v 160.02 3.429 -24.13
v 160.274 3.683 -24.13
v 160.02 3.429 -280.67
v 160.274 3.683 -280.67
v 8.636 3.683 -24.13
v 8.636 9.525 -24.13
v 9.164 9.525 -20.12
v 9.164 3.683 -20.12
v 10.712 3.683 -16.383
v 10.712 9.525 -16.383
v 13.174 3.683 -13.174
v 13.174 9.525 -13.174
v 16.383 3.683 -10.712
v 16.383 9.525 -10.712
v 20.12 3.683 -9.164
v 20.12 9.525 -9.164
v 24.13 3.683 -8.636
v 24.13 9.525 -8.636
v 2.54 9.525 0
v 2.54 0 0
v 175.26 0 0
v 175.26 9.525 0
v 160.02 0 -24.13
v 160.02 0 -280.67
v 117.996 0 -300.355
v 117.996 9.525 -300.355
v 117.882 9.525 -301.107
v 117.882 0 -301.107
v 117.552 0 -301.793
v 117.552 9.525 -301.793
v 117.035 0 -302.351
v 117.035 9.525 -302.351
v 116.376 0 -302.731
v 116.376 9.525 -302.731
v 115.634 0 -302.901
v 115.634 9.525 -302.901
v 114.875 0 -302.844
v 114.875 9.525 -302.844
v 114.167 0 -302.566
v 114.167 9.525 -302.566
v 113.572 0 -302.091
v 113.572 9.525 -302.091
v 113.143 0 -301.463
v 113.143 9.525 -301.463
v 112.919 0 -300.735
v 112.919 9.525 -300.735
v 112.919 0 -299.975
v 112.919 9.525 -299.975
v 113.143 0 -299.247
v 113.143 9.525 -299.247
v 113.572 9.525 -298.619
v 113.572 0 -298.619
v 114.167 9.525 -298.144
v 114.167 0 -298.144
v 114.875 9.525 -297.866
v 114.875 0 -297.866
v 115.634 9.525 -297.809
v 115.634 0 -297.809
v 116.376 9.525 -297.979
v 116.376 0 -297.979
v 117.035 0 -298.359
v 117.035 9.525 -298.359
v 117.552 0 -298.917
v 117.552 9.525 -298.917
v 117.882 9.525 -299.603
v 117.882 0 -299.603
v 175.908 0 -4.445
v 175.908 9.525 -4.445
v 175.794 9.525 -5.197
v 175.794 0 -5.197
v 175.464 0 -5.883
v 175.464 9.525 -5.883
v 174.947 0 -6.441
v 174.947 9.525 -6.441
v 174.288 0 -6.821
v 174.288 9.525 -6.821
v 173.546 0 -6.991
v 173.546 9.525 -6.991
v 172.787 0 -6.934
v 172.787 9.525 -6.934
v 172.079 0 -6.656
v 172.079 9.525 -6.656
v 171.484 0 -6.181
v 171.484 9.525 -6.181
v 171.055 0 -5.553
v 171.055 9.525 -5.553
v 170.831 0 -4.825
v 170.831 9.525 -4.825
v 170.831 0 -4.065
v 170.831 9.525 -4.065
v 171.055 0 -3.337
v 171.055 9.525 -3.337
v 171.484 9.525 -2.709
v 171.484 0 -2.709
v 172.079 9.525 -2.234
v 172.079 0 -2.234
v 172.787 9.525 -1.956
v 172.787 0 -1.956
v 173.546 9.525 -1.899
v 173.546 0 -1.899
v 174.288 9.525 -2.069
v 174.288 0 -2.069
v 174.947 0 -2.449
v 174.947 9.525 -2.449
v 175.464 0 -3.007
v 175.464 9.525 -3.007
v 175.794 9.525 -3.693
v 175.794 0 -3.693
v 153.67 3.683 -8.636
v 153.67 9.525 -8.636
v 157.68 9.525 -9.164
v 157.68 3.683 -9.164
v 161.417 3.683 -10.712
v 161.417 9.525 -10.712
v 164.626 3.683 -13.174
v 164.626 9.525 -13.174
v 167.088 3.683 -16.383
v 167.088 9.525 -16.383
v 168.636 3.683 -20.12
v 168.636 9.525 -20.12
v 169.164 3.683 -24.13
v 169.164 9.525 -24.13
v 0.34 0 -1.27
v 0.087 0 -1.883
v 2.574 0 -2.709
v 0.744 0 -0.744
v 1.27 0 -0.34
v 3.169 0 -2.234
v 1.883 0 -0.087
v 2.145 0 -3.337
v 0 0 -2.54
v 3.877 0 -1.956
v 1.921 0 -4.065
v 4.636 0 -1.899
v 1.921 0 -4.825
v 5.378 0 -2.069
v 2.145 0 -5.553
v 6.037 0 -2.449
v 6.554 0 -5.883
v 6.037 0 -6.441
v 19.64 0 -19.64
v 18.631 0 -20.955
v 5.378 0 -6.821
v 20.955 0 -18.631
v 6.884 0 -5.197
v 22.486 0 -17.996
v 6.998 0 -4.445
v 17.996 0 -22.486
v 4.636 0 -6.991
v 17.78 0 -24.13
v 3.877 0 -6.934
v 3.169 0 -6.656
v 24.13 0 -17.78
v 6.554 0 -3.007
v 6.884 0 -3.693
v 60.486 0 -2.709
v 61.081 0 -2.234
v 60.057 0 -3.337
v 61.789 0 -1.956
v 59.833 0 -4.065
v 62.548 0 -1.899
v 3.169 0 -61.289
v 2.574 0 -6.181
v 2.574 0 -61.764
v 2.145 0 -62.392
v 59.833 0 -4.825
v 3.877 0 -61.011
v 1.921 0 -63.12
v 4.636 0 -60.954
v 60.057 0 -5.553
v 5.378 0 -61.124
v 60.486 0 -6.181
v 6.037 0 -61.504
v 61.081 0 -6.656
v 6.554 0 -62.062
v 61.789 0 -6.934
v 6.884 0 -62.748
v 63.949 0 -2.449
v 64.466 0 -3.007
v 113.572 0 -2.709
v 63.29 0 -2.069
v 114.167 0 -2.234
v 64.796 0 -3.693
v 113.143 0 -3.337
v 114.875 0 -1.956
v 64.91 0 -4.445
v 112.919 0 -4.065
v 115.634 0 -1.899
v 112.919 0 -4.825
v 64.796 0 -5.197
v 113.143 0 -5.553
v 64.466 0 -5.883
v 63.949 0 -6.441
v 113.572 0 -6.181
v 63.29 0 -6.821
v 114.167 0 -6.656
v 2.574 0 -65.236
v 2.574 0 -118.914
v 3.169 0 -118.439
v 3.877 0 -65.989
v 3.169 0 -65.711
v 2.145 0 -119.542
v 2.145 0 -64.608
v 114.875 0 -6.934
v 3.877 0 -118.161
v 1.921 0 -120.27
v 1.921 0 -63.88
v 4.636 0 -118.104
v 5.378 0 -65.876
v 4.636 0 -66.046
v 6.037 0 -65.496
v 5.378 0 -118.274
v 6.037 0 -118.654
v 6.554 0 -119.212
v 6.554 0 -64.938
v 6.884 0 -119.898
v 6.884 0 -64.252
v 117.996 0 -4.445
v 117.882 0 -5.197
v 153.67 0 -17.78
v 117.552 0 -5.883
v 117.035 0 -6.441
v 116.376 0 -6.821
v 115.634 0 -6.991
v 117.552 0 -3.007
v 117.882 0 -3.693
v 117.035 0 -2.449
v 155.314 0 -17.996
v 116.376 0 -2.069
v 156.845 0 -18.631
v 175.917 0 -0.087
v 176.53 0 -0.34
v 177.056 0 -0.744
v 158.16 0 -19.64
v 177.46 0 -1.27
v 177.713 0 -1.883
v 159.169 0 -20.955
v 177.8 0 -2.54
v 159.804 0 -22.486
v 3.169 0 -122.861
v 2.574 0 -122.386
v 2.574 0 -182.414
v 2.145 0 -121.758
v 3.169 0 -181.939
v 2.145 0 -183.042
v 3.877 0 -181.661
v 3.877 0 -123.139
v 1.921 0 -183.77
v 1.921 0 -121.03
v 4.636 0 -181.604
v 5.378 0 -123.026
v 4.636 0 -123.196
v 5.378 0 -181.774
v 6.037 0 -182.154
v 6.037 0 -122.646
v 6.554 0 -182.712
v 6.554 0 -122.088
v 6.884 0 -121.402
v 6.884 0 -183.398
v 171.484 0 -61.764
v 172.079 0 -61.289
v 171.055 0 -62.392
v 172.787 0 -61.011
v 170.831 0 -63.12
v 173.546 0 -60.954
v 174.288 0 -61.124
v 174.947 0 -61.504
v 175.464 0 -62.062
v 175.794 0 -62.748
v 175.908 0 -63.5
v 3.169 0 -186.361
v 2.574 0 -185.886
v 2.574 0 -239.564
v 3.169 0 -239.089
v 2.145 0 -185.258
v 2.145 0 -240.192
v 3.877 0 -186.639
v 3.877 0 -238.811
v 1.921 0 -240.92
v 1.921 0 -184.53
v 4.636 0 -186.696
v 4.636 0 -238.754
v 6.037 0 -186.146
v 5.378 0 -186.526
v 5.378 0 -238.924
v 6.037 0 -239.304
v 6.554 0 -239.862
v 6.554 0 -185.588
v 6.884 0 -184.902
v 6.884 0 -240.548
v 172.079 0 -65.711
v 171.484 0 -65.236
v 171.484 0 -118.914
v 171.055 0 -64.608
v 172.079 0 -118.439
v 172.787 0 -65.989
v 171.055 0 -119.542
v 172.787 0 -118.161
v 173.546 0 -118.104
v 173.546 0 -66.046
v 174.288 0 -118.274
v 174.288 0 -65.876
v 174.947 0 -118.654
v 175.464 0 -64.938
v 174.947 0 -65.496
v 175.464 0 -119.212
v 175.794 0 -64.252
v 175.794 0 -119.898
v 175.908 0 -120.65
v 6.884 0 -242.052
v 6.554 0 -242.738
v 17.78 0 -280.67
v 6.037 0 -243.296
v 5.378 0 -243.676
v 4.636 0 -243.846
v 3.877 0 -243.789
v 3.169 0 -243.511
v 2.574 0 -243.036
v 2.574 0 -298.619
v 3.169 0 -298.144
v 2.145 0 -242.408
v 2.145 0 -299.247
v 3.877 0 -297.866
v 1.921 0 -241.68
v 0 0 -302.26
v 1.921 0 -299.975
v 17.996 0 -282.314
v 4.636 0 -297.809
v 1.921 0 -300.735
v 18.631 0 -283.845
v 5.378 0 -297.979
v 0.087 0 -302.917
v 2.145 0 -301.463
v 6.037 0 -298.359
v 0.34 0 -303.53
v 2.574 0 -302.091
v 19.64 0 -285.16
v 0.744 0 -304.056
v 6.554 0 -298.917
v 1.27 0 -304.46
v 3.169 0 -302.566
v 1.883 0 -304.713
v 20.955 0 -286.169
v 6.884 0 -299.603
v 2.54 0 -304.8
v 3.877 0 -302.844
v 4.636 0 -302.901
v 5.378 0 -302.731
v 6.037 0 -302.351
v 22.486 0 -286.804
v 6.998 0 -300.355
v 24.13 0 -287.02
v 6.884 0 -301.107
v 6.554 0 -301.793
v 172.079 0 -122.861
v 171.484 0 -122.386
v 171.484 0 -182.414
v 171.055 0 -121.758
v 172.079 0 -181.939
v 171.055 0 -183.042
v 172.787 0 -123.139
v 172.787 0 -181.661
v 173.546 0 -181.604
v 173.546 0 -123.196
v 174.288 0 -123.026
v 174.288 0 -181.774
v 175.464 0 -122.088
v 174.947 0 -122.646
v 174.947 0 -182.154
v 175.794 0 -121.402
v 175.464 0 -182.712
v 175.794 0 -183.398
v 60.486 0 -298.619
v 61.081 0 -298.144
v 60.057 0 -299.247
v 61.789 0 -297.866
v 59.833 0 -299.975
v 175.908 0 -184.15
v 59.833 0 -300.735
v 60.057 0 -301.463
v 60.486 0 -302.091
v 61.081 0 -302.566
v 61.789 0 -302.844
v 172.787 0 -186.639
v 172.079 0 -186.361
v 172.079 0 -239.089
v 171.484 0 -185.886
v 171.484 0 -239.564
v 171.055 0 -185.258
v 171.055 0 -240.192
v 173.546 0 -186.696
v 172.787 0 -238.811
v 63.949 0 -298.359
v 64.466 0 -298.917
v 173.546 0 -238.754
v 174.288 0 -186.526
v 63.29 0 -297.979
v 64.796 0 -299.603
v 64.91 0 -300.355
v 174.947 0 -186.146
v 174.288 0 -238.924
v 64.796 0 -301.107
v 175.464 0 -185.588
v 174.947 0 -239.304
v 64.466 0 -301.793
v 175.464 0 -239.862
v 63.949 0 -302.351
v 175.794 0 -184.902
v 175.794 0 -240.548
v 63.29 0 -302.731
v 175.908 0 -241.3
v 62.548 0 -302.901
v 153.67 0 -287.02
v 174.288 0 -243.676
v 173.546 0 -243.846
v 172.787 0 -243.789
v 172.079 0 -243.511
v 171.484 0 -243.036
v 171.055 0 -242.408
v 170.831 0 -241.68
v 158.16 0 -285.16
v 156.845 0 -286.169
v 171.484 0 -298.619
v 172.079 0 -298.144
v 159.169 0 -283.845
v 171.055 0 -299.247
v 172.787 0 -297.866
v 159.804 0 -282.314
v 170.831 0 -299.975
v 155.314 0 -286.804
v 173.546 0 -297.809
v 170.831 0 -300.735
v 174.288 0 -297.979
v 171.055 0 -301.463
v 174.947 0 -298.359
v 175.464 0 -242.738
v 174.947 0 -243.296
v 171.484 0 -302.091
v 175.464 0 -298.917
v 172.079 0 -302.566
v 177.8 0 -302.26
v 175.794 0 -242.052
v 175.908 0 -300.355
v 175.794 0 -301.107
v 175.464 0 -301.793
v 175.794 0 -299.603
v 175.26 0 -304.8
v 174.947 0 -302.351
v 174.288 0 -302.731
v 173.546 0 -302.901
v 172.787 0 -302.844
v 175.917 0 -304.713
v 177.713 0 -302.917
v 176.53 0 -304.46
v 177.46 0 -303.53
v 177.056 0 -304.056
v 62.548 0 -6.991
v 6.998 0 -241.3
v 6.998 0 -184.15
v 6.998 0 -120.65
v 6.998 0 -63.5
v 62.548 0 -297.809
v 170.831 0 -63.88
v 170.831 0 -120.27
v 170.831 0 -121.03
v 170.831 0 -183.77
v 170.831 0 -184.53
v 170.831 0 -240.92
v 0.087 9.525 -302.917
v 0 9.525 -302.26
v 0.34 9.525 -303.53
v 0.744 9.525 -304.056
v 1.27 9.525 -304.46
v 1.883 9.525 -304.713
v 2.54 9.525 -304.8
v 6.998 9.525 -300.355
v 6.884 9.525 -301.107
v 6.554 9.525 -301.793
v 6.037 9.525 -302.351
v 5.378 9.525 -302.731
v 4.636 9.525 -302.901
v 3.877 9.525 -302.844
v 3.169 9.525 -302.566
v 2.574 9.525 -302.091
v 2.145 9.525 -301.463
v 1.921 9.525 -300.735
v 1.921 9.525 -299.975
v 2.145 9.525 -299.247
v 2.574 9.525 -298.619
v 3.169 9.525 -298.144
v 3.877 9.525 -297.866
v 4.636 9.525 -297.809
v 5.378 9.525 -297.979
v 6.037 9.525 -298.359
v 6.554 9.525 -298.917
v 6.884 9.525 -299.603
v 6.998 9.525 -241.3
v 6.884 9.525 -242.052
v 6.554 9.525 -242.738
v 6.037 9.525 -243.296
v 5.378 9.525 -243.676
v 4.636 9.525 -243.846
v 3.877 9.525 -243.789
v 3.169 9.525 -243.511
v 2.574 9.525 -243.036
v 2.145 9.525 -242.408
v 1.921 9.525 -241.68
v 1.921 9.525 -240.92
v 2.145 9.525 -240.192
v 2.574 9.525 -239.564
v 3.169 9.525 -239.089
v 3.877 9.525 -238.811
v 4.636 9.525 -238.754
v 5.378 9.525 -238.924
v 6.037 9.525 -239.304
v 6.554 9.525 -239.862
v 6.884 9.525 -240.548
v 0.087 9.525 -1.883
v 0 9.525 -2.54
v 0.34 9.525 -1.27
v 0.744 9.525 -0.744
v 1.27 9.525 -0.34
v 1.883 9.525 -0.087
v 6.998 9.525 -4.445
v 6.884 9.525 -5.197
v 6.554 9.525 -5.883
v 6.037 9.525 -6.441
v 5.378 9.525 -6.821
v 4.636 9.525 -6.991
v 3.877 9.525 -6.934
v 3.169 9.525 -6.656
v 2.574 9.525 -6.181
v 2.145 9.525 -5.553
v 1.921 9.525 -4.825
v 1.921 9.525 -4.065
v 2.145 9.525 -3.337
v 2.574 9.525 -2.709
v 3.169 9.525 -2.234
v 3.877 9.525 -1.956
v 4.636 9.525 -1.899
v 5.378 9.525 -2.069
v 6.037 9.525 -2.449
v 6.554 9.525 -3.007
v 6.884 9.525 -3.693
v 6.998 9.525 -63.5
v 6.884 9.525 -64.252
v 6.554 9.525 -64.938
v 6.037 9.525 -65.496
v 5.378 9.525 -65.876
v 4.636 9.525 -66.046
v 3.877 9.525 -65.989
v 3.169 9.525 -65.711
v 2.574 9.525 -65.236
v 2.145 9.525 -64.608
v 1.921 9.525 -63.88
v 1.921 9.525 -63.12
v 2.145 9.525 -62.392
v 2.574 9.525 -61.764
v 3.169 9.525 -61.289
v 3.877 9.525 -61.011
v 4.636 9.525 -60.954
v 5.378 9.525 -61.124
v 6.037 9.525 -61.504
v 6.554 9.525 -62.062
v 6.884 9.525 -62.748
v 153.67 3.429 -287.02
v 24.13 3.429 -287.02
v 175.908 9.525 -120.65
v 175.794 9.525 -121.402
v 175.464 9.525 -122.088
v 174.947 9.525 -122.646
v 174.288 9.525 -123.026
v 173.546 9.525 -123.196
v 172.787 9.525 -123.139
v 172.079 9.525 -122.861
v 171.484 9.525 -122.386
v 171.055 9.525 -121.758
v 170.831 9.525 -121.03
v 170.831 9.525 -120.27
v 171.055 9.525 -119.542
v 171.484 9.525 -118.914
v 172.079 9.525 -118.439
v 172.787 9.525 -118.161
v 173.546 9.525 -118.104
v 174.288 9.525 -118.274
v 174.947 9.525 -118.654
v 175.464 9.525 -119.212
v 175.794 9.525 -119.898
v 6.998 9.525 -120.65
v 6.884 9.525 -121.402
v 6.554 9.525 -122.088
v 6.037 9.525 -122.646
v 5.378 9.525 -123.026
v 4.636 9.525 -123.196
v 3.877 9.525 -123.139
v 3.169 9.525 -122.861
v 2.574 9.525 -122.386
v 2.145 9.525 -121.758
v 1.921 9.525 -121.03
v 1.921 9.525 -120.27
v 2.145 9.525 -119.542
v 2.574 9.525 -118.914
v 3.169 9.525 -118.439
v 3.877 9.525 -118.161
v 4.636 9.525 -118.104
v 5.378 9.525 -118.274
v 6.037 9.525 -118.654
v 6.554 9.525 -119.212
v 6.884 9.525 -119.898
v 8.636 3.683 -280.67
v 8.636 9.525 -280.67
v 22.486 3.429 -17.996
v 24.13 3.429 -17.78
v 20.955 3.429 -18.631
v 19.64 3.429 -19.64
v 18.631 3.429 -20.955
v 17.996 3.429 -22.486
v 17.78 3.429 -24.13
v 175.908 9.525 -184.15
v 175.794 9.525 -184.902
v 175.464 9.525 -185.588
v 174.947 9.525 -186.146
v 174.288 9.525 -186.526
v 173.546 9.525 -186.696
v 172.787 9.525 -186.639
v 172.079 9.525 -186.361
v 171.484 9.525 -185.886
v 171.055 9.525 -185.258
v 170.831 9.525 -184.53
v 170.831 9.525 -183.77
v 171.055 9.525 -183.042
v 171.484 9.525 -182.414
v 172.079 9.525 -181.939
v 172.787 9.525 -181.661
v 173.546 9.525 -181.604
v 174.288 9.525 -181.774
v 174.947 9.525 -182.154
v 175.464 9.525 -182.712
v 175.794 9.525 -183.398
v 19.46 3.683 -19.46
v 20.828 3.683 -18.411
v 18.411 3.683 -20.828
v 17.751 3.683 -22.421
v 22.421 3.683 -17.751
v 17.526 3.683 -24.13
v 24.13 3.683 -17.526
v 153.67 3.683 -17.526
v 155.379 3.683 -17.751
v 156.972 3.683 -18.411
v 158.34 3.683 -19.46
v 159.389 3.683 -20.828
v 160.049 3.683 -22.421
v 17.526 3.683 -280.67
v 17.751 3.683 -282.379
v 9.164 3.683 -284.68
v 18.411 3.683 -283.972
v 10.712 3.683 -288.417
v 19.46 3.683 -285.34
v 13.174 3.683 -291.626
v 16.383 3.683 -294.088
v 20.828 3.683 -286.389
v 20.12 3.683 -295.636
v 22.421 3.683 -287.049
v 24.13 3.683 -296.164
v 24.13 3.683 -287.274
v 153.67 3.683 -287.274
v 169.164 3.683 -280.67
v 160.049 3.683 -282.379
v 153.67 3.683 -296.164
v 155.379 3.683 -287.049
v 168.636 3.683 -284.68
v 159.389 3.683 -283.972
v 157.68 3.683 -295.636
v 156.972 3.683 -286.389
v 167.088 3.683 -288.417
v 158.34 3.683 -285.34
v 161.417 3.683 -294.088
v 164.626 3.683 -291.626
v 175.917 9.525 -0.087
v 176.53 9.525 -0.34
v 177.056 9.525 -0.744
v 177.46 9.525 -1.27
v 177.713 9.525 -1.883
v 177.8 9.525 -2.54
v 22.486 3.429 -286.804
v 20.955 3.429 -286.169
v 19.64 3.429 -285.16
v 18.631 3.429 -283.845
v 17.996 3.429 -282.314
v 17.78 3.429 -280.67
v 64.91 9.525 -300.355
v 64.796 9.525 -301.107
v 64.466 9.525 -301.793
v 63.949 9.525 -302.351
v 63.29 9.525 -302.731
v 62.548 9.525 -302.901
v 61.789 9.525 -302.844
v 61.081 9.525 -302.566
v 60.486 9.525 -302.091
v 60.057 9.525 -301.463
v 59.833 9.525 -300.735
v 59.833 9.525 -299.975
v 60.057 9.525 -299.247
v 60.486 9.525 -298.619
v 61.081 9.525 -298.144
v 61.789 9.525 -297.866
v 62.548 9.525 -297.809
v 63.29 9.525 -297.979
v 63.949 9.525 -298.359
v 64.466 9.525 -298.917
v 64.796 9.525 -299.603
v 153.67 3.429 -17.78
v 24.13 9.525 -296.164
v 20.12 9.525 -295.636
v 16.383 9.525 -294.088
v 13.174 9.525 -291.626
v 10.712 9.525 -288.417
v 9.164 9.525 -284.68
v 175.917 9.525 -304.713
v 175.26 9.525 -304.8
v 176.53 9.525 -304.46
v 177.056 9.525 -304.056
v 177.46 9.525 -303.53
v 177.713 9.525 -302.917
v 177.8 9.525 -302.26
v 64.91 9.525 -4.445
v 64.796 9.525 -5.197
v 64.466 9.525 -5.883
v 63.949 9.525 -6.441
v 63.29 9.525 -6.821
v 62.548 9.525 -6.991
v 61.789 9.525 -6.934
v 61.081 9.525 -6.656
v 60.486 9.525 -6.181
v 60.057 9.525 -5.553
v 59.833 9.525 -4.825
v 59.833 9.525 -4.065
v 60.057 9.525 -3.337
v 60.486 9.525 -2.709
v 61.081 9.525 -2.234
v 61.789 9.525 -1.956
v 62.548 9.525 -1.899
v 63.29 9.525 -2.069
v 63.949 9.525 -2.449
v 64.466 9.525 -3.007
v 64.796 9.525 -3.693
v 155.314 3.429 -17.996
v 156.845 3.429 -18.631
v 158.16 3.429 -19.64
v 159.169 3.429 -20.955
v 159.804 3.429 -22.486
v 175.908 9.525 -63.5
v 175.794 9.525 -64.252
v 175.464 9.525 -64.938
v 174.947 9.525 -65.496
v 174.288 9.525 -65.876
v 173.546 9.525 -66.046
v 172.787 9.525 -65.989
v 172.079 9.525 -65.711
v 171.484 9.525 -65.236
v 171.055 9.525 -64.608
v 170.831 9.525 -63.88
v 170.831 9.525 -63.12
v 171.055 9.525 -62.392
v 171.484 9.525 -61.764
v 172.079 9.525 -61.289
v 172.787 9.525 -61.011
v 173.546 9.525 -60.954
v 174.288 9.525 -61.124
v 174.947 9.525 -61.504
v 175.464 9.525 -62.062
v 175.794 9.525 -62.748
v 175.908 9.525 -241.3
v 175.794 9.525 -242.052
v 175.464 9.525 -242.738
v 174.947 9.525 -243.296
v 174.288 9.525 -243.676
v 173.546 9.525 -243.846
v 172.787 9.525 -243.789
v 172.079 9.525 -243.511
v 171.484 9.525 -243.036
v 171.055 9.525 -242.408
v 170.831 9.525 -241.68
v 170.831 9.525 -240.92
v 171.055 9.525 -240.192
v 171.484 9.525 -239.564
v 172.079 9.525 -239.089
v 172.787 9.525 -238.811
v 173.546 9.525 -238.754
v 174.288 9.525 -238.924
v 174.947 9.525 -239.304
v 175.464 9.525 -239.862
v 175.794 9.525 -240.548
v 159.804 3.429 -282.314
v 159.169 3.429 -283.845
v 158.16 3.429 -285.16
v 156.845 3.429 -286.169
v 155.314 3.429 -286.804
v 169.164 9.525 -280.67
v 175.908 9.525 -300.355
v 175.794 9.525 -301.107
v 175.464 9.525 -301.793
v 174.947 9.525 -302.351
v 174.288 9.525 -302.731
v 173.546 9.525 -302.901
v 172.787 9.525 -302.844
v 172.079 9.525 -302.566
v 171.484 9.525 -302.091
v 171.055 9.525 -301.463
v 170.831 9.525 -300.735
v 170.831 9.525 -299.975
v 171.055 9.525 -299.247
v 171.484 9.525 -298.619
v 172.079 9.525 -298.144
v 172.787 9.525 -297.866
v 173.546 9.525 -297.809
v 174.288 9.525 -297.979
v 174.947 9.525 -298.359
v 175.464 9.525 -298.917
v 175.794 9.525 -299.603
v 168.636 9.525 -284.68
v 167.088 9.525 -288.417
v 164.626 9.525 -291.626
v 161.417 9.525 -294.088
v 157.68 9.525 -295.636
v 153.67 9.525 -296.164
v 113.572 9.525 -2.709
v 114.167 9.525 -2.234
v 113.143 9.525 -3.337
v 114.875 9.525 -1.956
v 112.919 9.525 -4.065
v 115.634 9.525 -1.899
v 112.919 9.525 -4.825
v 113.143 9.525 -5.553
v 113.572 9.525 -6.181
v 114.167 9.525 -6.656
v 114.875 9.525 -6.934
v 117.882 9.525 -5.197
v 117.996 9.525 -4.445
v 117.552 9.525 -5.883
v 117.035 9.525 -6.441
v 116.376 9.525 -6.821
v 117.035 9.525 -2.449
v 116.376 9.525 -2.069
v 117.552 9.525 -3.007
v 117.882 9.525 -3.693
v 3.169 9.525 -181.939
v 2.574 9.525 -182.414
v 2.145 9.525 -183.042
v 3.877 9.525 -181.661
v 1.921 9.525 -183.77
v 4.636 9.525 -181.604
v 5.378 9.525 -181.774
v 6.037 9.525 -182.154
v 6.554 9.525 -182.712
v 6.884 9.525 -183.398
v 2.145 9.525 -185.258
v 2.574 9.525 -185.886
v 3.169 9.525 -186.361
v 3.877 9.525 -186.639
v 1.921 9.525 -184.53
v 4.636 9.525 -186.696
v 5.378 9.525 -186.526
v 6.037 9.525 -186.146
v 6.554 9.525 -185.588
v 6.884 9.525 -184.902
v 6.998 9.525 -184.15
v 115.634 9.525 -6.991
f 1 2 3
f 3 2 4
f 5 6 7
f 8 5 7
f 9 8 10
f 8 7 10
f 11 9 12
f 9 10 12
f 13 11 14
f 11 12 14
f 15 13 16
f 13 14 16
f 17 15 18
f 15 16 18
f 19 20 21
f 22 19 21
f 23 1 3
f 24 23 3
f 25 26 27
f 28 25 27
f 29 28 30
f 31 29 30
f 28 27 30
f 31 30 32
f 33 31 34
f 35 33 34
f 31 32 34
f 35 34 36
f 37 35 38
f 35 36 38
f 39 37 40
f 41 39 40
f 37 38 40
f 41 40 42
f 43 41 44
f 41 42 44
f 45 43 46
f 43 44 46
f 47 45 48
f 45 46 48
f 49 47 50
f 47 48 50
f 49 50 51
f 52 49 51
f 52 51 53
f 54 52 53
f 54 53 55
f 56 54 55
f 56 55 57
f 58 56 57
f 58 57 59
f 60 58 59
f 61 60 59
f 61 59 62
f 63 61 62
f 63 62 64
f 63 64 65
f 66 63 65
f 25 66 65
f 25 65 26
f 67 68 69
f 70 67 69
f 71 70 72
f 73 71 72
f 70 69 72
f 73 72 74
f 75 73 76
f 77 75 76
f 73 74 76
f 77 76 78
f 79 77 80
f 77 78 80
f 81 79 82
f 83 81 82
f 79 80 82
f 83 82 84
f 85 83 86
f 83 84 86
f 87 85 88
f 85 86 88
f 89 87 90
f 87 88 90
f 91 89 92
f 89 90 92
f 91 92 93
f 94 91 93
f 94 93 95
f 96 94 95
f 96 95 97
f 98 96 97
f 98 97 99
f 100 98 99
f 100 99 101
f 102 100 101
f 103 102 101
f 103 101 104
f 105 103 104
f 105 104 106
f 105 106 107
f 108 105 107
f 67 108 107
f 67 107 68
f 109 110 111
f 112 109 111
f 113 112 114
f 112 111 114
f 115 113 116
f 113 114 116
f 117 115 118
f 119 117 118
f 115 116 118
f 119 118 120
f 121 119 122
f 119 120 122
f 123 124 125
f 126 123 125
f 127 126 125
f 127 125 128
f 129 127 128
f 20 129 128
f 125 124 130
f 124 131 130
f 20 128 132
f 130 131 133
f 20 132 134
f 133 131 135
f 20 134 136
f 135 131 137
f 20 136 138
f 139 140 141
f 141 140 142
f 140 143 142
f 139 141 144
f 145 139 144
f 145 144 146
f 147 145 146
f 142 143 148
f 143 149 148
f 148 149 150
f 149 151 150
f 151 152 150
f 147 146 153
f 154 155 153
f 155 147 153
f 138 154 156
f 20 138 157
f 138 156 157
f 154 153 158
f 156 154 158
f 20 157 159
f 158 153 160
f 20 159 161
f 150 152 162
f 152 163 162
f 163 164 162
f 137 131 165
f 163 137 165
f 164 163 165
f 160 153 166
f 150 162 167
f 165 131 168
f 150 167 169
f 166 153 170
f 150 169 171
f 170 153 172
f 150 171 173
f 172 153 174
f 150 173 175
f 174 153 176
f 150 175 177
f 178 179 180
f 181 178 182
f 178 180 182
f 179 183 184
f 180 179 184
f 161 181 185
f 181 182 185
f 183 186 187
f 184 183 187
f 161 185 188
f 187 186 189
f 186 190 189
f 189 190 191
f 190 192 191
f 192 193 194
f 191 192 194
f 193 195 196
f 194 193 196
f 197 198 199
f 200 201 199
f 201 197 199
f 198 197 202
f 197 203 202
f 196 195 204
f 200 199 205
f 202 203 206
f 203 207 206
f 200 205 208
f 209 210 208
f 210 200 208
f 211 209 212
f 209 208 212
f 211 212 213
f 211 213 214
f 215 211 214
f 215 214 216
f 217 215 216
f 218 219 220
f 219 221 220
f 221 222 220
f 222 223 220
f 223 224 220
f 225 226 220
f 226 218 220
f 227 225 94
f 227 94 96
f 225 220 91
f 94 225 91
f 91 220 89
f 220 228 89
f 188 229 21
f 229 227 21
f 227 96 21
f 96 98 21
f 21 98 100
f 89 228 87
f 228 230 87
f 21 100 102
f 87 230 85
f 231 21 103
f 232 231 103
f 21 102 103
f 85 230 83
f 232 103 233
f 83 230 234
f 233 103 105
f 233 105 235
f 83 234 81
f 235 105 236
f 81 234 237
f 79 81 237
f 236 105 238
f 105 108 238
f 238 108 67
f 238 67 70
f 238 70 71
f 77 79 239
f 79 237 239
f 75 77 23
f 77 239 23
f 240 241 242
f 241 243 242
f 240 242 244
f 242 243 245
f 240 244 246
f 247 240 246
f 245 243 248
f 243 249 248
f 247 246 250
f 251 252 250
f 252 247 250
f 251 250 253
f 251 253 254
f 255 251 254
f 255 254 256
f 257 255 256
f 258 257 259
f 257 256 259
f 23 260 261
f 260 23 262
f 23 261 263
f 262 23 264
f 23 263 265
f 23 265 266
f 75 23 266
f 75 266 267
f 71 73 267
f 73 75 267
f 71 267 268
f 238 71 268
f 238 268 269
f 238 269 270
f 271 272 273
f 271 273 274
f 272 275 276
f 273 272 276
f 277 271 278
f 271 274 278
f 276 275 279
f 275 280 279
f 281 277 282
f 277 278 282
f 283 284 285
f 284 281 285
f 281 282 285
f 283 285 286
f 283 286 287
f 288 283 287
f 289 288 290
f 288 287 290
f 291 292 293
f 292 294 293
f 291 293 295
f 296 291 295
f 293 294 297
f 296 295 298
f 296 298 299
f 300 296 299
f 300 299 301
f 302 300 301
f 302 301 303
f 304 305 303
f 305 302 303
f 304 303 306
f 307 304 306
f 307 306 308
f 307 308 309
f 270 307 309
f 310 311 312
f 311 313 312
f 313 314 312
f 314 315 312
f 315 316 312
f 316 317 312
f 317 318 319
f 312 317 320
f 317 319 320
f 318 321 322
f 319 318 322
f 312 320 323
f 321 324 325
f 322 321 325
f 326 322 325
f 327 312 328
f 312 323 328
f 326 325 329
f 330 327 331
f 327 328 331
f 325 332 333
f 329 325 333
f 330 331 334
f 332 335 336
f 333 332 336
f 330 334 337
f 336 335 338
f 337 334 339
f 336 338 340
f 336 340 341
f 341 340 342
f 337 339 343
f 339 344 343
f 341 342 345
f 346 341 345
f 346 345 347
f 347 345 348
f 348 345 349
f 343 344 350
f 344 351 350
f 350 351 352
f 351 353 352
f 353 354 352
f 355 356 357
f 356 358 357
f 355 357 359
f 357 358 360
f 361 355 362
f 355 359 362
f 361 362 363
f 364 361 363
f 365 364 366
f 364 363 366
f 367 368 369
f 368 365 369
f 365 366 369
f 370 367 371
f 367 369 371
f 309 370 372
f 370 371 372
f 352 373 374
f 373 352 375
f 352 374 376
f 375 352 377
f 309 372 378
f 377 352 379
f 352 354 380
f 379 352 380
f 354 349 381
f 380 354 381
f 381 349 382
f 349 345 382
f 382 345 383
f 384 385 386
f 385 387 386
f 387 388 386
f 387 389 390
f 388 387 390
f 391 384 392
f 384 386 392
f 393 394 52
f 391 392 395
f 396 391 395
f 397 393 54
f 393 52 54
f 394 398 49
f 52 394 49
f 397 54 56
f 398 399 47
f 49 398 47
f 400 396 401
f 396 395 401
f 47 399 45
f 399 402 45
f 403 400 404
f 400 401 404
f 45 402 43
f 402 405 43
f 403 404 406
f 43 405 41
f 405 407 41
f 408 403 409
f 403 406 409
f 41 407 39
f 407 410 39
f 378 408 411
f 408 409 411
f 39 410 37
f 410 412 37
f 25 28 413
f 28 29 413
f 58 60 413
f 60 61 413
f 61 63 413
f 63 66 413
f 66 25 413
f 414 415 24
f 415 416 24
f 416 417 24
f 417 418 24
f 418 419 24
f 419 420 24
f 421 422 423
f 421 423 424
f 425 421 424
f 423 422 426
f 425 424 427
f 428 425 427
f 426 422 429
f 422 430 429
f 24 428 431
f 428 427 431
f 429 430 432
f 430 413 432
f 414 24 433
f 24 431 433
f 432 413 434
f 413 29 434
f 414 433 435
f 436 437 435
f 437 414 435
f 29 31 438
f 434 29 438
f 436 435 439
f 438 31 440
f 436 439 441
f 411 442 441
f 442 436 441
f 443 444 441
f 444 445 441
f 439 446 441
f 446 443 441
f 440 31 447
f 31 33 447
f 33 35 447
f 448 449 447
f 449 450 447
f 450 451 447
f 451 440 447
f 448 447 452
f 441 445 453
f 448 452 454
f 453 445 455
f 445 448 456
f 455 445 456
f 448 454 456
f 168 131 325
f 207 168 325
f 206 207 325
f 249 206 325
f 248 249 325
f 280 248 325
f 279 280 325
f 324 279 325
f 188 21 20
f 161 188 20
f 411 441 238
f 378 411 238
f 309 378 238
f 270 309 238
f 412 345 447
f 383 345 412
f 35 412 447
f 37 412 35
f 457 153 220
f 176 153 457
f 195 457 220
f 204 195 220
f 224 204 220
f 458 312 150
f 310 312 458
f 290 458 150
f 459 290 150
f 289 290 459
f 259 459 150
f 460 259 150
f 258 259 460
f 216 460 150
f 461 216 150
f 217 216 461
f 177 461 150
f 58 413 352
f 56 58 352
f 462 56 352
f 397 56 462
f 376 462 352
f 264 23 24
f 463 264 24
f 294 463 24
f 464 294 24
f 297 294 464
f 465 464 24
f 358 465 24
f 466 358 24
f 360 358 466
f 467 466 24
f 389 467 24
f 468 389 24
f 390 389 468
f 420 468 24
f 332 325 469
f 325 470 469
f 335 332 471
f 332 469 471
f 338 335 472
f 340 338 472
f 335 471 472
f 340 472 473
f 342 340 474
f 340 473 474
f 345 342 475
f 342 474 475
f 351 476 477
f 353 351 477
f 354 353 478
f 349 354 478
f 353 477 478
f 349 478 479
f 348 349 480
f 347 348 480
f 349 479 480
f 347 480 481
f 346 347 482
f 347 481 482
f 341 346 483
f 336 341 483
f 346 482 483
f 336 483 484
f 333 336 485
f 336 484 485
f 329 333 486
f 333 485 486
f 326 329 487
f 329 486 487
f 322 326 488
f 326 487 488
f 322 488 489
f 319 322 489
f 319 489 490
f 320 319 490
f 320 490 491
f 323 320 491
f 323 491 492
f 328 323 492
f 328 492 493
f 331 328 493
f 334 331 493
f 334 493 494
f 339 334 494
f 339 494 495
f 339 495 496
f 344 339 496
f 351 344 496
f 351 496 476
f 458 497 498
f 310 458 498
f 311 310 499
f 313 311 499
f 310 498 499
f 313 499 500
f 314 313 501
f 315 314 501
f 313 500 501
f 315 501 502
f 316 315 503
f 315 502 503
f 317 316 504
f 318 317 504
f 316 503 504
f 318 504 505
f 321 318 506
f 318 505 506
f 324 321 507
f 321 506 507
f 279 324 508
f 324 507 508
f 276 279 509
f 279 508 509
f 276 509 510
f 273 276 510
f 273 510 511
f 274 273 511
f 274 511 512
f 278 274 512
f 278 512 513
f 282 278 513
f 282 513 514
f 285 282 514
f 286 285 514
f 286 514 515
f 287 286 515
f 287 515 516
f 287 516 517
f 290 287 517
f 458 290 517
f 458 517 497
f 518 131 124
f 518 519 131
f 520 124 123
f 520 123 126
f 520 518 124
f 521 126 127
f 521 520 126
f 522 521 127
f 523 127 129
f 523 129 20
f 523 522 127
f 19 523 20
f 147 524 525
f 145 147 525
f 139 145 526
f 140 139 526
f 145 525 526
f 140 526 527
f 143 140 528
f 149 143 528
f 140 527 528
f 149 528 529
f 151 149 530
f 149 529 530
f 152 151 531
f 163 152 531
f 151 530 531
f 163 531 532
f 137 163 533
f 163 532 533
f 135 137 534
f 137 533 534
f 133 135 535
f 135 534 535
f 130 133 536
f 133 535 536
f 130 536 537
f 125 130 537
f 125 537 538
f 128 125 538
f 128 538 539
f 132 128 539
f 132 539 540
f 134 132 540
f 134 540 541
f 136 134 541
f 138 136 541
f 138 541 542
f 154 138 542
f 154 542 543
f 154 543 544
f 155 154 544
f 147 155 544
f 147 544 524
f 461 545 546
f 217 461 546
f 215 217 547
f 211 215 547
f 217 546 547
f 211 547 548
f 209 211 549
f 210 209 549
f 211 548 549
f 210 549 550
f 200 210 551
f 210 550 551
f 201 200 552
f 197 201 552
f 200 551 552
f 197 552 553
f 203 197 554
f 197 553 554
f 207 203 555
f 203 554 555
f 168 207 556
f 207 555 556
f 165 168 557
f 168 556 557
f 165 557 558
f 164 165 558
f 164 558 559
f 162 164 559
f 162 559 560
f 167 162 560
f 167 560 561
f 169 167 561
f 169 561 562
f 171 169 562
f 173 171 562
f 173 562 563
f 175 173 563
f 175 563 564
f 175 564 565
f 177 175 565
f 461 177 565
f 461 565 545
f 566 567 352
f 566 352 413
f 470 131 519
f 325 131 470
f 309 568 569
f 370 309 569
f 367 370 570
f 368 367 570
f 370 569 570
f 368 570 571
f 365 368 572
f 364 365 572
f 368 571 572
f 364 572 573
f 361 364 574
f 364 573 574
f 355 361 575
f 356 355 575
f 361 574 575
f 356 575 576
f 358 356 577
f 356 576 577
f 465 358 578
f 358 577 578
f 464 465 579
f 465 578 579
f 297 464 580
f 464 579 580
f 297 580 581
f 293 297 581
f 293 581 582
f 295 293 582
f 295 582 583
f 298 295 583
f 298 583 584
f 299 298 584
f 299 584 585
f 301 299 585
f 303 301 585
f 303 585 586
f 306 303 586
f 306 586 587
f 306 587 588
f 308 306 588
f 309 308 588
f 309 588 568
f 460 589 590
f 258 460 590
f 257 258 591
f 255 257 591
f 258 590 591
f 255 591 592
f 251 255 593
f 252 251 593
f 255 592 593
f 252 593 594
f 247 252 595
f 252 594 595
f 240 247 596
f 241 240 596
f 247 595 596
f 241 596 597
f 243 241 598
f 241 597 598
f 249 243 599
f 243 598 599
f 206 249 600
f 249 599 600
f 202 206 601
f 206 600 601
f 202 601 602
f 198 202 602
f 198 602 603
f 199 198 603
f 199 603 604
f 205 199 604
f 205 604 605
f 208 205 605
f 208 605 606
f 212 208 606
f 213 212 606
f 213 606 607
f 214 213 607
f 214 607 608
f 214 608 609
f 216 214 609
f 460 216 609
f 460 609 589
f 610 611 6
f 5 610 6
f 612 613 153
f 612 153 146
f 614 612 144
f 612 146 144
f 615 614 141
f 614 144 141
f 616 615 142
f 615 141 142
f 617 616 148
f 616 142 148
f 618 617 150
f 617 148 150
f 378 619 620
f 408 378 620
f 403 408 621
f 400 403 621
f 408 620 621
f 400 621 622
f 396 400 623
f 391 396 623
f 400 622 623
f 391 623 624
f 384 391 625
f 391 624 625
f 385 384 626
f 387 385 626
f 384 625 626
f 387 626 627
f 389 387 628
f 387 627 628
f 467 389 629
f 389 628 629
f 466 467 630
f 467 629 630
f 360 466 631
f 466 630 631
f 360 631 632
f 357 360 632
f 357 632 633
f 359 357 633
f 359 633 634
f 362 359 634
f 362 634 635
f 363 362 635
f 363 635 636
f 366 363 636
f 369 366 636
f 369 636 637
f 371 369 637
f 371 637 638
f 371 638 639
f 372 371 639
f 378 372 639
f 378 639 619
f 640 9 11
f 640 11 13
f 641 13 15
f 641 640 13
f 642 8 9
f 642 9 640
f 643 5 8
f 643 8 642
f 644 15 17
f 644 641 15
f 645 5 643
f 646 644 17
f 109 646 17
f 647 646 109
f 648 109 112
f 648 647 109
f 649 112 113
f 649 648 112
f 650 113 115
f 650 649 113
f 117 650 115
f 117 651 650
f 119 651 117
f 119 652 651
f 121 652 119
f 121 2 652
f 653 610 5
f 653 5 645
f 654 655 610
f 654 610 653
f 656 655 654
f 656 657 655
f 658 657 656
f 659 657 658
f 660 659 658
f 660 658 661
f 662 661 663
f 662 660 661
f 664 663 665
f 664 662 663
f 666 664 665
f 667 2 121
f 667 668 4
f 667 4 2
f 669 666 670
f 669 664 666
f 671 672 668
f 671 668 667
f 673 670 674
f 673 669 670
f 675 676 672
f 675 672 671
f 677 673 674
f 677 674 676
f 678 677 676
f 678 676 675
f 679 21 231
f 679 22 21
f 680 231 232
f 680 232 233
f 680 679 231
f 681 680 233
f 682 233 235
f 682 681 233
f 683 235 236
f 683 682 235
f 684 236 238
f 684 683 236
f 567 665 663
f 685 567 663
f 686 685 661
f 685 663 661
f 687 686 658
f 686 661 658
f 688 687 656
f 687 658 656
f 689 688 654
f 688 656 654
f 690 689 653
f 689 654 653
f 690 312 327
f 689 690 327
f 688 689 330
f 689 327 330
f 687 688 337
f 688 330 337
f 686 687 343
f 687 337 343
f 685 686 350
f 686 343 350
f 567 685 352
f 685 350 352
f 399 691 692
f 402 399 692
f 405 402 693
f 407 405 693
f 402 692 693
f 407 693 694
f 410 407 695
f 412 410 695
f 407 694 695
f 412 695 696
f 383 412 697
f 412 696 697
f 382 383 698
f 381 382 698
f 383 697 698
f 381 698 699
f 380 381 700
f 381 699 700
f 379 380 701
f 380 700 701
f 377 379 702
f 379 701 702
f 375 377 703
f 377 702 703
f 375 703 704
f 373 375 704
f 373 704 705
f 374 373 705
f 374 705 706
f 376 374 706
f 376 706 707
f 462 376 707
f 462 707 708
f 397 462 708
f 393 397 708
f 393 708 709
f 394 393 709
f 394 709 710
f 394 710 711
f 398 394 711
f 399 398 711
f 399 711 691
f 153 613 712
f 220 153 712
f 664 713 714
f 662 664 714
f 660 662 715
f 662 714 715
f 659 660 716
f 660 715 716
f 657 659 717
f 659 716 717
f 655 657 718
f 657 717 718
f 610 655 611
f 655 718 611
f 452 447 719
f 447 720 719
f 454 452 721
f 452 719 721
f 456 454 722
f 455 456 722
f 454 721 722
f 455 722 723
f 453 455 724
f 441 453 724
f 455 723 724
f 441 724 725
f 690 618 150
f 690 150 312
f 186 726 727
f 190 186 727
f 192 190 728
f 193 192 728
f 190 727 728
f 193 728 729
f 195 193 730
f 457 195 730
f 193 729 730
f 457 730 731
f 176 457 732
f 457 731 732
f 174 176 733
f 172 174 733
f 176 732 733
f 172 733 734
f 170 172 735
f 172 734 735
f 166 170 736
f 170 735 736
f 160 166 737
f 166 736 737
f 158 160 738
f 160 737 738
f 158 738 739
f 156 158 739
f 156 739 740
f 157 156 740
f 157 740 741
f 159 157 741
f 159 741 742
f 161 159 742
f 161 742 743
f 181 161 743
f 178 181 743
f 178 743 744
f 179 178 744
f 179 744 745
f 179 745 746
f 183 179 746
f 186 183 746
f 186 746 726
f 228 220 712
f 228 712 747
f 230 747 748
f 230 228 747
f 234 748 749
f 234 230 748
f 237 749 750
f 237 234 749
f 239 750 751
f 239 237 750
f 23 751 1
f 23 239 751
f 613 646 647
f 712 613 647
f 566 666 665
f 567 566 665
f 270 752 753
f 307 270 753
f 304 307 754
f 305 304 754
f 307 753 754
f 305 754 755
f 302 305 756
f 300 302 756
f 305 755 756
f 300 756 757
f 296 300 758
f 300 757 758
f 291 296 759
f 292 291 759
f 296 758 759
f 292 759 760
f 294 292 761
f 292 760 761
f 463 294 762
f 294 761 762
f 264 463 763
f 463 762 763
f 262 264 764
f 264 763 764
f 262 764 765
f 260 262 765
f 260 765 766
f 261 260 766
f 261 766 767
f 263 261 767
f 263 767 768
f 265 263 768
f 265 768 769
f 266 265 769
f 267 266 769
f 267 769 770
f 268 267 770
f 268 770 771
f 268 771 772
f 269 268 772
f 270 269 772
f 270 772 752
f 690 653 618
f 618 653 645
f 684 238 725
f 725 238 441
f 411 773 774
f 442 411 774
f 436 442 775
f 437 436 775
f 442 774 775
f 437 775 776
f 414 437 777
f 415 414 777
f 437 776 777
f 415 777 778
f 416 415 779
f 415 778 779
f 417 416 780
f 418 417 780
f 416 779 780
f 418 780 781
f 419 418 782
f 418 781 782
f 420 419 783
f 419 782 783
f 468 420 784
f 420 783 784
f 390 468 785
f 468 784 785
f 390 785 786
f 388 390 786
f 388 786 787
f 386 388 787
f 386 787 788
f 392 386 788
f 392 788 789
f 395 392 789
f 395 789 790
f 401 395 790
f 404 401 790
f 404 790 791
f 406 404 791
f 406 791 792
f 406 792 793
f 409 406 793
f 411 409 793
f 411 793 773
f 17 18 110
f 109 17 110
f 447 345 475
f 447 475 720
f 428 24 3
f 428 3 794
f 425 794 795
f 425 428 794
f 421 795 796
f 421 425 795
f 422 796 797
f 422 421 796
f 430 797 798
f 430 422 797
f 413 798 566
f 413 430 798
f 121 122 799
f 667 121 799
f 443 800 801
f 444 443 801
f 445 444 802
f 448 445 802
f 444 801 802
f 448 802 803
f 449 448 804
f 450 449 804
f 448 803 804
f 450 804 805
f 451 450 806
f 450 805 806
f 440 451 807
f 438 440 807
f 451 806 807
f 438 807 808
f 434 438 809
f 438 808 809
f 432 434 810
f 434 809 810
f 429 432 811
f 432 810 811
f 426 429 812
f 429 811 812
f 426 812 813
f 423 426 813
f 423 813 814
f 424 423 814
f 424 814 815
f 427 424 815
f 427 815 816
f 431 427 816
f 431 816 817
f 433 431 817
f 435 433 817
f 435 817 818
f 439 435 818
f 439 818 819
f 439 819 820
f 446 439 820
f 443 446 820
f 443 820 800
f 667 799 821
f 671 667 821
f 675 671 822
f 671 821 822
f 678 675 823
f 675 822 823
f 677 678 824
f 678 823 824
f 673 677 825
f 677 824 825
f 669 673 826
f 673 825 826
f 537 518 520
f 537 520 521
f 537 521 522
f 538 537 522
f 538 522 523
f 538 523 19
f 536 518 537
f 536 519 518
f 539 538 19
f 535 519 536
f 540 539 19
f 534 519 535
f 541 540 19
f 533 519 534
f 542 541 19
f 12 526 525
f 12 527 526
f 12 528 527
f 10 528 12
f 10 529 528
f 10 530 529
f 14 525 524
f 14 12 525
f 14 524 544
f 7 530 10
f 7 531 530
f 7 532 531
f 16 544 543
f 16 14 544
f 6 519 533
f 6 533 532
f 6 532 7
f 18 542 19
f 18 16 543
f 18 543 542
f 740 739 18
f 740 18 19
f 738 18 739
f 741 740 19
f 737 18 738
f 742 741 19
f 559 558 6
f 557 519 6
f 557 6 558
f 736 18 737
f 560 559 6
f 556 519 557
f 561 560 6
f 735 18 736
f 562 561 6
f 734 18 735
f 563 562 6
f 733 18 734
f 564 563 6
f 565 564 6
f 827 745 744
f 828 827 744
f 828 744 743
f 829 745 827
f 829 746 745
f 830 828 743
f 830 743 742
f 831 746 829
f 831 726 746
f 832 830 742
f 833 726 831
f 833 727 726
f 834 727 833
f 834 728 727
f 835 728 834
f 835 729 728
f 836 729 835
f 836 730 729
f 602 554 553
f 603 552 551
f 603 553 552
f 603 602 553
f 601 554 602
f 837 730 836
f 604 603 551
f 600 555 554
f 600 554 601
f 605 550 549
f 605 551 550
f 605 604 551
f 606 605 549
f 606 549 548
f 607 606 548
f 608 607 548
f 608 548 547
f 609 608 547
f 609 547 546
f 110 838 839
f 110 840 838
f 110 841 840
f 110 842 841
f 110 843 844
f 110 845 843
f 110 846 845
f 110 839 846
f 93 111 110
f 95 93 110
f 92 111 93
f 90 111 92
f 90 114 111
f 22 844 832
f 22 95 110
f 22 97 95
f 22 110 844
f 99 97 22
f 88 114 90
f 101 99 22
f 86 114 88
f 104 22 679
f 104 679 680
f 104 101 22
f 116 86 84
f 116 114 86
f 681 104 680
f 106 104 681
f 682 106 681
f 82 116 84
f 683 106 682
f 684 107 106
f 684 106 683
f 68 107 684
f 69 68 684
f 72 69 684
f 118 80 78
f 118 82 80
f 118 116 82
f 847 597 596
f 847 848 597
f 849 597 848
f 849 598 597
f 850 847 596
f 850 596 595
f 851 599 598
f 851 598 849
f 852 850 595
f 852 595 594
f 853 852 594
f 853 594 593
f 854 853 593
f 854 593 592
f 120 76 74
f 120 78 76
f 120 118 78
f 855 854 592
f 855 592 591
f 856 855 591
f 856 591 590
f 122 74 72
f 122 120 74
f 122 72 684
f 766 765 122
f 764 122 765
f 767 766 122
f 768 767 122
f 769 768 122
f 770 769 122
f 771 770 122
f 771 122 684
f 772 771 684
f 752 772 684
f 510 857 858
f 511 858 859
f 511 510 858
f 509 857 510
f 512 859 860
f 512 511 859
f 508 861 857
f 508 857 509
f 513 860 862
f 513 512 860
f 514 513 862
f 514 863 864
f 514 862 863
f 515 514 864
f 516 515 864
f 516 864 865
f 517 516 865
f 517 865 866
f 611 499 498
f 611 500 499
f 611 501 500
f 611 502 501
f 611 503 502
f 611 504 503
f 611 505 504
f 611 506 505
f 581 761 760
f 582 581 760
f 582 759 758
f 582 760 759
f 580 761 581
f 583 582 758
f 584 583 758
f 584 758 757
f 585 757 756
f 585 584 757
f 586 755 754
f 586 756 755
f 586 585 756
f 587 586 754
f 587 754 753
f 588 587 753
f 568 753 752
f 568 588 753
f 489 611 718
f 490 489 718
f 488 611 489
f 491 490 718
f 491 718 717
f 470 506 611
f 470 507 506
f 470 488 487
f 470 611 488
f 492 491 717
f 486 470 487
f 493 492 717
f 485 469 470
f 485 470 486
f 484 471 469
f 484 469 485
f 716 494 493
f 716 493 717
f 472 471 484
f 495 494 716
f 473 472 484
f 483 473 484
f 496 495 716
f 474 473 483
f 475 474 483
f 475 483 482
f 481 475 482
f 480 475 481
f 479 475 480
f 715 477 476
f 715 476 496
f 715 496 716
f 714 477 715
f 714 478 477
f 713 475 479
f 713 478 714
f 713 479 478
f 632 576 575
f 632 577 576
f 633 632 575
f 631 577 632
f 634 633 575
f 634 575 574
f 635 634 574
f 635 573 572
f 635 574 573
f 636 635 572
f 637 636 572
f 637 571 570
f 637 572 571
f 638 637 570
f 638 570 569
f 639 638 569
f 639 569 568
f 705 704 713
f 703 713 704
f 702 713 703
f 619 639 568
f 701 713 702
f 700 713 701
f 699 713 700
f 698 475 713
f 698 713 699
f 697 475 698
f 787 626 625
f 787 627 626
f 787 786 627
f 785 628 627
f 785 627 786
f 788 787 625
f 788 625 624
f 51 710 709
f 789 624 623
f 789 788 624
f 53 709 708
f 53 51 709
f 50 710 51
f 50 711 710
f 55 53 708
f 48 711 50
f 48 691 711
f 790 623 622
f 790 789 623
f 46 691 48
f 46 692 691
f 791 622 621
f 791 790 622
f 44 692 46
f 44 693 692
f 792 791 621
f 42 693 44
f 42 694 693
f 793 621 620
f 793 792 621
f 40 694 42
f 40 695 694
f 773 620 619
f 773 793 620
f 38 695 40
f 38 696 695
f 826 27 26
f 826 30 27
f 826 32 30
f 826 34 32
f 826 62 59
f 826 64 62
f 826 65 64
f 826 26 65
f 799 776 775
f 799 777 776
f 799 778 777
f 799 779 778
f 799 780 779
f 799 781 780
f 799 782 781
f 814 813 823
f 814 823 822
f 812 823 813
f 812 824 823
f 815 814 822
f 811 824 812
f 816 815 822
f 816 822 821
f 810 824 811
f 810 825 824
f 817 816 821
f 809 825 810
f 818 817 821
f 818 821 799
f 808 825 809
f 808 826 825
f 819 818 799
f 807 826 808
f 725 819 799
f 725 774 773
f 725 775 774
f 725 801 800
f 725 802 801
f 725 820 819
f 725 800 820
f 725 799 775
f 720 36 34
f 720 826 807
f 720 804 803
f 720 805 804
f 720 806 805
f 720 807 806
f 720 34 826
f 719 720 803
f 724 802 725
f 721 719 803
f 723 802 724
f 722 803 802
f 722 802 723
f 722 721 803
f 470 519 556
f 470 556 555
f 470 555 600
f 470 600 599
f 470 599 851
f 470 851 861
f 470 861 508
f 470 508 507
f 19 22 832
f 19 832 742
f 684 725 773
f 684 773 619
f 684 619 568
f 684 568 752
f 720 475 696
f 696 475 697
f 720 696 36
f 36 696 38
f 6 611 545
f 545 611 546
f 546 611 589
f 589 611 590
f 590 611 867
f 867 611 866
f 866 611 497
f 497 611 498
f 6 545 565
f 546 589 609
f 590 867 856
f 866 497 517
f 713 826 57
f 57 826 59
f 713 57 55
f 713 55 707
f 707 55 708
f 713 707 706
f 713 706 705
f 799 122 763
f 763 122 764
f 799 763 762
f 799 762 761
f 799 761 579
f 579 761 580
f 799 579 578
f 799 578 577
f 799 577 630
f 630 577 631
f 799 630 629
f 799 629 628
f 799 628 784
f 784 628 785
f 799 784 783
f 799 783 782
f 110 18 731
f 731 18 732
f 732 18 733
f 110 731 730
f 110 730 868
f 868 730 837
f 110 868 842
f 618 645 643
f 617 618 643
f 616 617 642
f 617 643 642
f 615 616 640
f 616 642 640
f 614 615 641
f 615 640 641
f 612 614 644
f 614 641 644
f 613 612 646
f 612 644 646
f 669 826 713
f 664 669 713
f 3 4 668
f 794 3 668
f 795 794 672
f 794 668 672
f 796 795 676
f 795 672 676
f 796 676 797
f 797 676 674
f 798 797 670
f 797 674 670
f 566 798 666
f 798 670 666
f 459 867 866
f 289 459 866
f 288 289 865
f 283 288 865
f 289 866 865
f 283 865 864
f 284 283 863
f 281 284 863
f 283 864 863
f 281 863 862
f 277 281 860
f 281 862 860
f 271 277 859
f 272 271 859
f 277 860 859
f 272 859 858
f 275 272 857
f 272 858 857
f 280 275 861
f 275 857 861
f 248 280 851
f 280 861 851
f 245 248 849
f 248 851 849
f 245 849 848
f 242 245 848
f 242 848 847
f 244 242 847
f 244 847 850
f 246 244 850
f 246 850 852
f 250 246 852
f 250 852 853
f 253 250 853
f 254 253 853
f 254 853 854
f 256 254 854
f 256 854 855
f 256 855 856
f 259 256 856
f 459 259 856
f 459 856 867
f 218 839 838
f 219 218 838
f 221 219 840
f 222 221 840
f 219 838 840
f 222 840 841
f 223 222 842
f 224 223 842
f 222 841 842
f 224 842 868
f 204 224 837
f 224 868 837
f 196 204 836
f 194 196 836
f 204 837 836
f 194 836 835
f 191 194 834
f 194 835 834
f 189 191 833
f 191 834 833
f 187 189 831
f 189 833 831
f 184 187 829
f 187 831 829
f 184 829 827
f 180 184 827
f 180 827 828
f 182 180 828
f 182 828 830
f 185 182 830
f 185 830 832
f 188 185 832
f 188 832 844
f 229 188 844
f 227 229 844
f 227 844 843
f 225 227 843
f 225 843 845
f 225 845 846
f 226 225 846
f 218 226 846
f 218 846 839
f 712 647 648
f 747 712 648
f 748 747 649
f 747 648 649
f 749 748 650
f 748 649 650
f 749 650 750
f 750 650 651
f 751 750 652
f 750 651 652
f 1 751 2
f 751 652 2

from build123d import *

# Parameters (mm, degrees)
SKETCH1_W           = 177.8
SKETCH1_H           = 304.8
BOSS_EXTRUDE1_DEPTH = 9.525
SKETCH2_W           = 142.24
SKETCH2_H           = 269.24
CUT_EXTRUDE1_DEPTH  = 10.525
SKETCH3_R           = 2.5527
CUT_EXTRUDE2_DEPTH  = 10.525
FILLET4_R           = 6.35
CUT_EXTRUDE5_DEPTH  = 5.842
CHAMFER1_SIZE       = 0.254
FILLET5_R           = 2.54


with BuildPart() as part:
    # Sketch1 → Boss-Extrude1 (new body)
    with BuildSketch(Plane(origin=(0, 0, 0), x_dir=(1, 0, 0), z_dir=(0, 1, 0))):
        with Locations((88.9, 152.4)):
            Rectangle(SKETCH1_W, SKETCH1_H)
    extrude(amount=BOSS_EXTRUDE1_DEPTH)

    # Sketch2 → Cut-Extrude1 (cut, through all)
    with BuildSketch(Plane(origin=(0, 9.525, 0), x_dir=(1, 0, 0), z_dir=(0, 1, 0))):
        with Locations((88.9, 152.4)):
            Rectangle(SKETCH2_W, SKETCH2_H)
    extrude(amount=-CUT_EXTRUDE1_DEPTH, mode=Mode.SUBTRACT)

    # Sketch3 → Cut-Extrude2 (cut, through all)
    with BuildSketch(Plane(origin=(0, 9.525, 0), x_dir=(1, 0, 0), z_dir=(0, 1, 0))):
        with Locations((4.445, 184.15)):
            Circle(SKETCH3_R)
        with Locations((4.445, 241.3)):
            Circle(SKETCH3_R)
        with Locations((62.357, 300.355)):
            Circle(SKETCH3_R)
        with Locations((4.445, 300.355)):
            Circle(SKETCH3_R)
        with Locations((173.355, 184.15)):
            Circle(SKETCH3_R)
        with Locations((173.355, 241.3)):
            Circle(SKETCH3_R)
        with Locations((173.355, 300.355)):
            Circle(SKETCH3_R)
        with Locations((115.443, 300.355)):
            Circle(SKETCH3_R)
        with Locations((173.355, 120.65)):
            Circle(SKETCH3_R)
        with Locations((173.355, 63.5)):
            Circle(SKETCH3_R)
        with Locations((173.355, 4.445)):
            Circle(SKETCH3_R)
        with Locations((115.443, 4.445)):
            Circle(SKETCH3_R)
        with Locations((62.357, 4.445)):
            Circle(SKETCH3_R)
        with Locations((4.445, 4.445)):
            Circle(SKETCH3_R)
        with Locations((4.445, 63.5)):
            Circle(SKETCH3_R)
        with Locations((4.445, 120.65)):
            Circle(SKETCH3_R)
    extrude(amount=-CUT_EXTRUDE2_DEPTH, mode=Mode.SUBTRACT)

    # Fillet4
    fillet4_edges = [part.edges().sort_by_distance(p)[0] for p in [
        (17.78, 4.7625, -17.78),
        (17.78, 4.7625, -287.02),
        (160.02, 4.7625, -287.02),
        (160.02, 4.7625, -17.78),
    ]]
    fillet(fillet4_edges, radius=FILLET4_R)

    # Sketch7 → Cut-Extrude5 (cut)
    with BuildSketch(Plane(origin=(0, 9.525, 0), x_dir=(1, 0, 0), z_dir=(0, 1, 0))):
        with BuildLine():
            Line((8.636, 280.67), (8.636, 24.13))
            ThreePointArc((8.636, 24.13), (13.174087532, 13.174087532), (24.13, 8.636))
            Line((24.13, 8.636), (153.67, 8.636))
            ThreePointArc((153.67, 8.636), (164.625912468, 13.174087532), (169.164, 24.13))
            Line((169.164, 24.13), (169.164, 280.67))
            ThreePointArc((169.164, 280.67), (164.625912468, 291.625912468), (153.67, 296.164))
            Line((153.67, 296.164), (24.13, 296.164))
            ThreePointArc((24.13, 296.164), (13.174087532, 291.625912468), (8.636, 280.67))
        make_face()
        with BuildLine():
            Line((24.13, 17.78), (153.67, 17.78))
            ThreePointArc((153.67, 17.78), (158.160128061, 19.639871939), (160.02, 24.13))
            Line((160.02, 24.13), (160.02, 280.67))
            ThreePointArc((160.02, 280.67), (158.160128061, 285.160128061), (153.67, 287.02))
            Line((153.67, 287.02), (24.13, 287.02))
            ThreePointArc((24.13, 287.02), (19.639871939, 285.160128061), (17.78, 280.67))
            Line((17.78, 280.67), (17.78, 24.13))
            ThreePointArc((17.78, 24.13), (19.639871939, 19.639871939), (24.13, 17.78))
        make_face(mode=Mode.SUBTRACT)
    extrude(amount=-CUT_EXTRUDE5_DEPTH, mode=Mode.SUBTRACT)

    # Chamfer1
    chamfer1_edges = [part.edges().sort_by_distance(p)[0] for p in [
        (17.78, 3.683, -152.4),
        (19.639871939, 3.683, -19.639871939),
        (88.9, 3.683, -17.78),
        (158.160128061, 3.683, -19.639871939),
        (160.02, 3.683, -152.4),
        (158.160128061, 3.683, -285.160128061),
        (88.9, 3.683, -287.02),
        (19.639871939, 3.683, -285.160128061),
    ]]
    chamfer(chamfer1_edges, length=CHAMFER1_SIZE)

    # Fillet5
    fillet5_edges = [part.edges().sort_by_distance(p)[0] for p in [
        (0, 4.7625, -304.8),
        (177.8, 4.7625, -304.8),
        (177.8, 4.7625, 0),
        (0, 4.7625, 0),
    ]]
    fillet(fillet5_edges, radius=FILLET5_R)


solid = part.part
